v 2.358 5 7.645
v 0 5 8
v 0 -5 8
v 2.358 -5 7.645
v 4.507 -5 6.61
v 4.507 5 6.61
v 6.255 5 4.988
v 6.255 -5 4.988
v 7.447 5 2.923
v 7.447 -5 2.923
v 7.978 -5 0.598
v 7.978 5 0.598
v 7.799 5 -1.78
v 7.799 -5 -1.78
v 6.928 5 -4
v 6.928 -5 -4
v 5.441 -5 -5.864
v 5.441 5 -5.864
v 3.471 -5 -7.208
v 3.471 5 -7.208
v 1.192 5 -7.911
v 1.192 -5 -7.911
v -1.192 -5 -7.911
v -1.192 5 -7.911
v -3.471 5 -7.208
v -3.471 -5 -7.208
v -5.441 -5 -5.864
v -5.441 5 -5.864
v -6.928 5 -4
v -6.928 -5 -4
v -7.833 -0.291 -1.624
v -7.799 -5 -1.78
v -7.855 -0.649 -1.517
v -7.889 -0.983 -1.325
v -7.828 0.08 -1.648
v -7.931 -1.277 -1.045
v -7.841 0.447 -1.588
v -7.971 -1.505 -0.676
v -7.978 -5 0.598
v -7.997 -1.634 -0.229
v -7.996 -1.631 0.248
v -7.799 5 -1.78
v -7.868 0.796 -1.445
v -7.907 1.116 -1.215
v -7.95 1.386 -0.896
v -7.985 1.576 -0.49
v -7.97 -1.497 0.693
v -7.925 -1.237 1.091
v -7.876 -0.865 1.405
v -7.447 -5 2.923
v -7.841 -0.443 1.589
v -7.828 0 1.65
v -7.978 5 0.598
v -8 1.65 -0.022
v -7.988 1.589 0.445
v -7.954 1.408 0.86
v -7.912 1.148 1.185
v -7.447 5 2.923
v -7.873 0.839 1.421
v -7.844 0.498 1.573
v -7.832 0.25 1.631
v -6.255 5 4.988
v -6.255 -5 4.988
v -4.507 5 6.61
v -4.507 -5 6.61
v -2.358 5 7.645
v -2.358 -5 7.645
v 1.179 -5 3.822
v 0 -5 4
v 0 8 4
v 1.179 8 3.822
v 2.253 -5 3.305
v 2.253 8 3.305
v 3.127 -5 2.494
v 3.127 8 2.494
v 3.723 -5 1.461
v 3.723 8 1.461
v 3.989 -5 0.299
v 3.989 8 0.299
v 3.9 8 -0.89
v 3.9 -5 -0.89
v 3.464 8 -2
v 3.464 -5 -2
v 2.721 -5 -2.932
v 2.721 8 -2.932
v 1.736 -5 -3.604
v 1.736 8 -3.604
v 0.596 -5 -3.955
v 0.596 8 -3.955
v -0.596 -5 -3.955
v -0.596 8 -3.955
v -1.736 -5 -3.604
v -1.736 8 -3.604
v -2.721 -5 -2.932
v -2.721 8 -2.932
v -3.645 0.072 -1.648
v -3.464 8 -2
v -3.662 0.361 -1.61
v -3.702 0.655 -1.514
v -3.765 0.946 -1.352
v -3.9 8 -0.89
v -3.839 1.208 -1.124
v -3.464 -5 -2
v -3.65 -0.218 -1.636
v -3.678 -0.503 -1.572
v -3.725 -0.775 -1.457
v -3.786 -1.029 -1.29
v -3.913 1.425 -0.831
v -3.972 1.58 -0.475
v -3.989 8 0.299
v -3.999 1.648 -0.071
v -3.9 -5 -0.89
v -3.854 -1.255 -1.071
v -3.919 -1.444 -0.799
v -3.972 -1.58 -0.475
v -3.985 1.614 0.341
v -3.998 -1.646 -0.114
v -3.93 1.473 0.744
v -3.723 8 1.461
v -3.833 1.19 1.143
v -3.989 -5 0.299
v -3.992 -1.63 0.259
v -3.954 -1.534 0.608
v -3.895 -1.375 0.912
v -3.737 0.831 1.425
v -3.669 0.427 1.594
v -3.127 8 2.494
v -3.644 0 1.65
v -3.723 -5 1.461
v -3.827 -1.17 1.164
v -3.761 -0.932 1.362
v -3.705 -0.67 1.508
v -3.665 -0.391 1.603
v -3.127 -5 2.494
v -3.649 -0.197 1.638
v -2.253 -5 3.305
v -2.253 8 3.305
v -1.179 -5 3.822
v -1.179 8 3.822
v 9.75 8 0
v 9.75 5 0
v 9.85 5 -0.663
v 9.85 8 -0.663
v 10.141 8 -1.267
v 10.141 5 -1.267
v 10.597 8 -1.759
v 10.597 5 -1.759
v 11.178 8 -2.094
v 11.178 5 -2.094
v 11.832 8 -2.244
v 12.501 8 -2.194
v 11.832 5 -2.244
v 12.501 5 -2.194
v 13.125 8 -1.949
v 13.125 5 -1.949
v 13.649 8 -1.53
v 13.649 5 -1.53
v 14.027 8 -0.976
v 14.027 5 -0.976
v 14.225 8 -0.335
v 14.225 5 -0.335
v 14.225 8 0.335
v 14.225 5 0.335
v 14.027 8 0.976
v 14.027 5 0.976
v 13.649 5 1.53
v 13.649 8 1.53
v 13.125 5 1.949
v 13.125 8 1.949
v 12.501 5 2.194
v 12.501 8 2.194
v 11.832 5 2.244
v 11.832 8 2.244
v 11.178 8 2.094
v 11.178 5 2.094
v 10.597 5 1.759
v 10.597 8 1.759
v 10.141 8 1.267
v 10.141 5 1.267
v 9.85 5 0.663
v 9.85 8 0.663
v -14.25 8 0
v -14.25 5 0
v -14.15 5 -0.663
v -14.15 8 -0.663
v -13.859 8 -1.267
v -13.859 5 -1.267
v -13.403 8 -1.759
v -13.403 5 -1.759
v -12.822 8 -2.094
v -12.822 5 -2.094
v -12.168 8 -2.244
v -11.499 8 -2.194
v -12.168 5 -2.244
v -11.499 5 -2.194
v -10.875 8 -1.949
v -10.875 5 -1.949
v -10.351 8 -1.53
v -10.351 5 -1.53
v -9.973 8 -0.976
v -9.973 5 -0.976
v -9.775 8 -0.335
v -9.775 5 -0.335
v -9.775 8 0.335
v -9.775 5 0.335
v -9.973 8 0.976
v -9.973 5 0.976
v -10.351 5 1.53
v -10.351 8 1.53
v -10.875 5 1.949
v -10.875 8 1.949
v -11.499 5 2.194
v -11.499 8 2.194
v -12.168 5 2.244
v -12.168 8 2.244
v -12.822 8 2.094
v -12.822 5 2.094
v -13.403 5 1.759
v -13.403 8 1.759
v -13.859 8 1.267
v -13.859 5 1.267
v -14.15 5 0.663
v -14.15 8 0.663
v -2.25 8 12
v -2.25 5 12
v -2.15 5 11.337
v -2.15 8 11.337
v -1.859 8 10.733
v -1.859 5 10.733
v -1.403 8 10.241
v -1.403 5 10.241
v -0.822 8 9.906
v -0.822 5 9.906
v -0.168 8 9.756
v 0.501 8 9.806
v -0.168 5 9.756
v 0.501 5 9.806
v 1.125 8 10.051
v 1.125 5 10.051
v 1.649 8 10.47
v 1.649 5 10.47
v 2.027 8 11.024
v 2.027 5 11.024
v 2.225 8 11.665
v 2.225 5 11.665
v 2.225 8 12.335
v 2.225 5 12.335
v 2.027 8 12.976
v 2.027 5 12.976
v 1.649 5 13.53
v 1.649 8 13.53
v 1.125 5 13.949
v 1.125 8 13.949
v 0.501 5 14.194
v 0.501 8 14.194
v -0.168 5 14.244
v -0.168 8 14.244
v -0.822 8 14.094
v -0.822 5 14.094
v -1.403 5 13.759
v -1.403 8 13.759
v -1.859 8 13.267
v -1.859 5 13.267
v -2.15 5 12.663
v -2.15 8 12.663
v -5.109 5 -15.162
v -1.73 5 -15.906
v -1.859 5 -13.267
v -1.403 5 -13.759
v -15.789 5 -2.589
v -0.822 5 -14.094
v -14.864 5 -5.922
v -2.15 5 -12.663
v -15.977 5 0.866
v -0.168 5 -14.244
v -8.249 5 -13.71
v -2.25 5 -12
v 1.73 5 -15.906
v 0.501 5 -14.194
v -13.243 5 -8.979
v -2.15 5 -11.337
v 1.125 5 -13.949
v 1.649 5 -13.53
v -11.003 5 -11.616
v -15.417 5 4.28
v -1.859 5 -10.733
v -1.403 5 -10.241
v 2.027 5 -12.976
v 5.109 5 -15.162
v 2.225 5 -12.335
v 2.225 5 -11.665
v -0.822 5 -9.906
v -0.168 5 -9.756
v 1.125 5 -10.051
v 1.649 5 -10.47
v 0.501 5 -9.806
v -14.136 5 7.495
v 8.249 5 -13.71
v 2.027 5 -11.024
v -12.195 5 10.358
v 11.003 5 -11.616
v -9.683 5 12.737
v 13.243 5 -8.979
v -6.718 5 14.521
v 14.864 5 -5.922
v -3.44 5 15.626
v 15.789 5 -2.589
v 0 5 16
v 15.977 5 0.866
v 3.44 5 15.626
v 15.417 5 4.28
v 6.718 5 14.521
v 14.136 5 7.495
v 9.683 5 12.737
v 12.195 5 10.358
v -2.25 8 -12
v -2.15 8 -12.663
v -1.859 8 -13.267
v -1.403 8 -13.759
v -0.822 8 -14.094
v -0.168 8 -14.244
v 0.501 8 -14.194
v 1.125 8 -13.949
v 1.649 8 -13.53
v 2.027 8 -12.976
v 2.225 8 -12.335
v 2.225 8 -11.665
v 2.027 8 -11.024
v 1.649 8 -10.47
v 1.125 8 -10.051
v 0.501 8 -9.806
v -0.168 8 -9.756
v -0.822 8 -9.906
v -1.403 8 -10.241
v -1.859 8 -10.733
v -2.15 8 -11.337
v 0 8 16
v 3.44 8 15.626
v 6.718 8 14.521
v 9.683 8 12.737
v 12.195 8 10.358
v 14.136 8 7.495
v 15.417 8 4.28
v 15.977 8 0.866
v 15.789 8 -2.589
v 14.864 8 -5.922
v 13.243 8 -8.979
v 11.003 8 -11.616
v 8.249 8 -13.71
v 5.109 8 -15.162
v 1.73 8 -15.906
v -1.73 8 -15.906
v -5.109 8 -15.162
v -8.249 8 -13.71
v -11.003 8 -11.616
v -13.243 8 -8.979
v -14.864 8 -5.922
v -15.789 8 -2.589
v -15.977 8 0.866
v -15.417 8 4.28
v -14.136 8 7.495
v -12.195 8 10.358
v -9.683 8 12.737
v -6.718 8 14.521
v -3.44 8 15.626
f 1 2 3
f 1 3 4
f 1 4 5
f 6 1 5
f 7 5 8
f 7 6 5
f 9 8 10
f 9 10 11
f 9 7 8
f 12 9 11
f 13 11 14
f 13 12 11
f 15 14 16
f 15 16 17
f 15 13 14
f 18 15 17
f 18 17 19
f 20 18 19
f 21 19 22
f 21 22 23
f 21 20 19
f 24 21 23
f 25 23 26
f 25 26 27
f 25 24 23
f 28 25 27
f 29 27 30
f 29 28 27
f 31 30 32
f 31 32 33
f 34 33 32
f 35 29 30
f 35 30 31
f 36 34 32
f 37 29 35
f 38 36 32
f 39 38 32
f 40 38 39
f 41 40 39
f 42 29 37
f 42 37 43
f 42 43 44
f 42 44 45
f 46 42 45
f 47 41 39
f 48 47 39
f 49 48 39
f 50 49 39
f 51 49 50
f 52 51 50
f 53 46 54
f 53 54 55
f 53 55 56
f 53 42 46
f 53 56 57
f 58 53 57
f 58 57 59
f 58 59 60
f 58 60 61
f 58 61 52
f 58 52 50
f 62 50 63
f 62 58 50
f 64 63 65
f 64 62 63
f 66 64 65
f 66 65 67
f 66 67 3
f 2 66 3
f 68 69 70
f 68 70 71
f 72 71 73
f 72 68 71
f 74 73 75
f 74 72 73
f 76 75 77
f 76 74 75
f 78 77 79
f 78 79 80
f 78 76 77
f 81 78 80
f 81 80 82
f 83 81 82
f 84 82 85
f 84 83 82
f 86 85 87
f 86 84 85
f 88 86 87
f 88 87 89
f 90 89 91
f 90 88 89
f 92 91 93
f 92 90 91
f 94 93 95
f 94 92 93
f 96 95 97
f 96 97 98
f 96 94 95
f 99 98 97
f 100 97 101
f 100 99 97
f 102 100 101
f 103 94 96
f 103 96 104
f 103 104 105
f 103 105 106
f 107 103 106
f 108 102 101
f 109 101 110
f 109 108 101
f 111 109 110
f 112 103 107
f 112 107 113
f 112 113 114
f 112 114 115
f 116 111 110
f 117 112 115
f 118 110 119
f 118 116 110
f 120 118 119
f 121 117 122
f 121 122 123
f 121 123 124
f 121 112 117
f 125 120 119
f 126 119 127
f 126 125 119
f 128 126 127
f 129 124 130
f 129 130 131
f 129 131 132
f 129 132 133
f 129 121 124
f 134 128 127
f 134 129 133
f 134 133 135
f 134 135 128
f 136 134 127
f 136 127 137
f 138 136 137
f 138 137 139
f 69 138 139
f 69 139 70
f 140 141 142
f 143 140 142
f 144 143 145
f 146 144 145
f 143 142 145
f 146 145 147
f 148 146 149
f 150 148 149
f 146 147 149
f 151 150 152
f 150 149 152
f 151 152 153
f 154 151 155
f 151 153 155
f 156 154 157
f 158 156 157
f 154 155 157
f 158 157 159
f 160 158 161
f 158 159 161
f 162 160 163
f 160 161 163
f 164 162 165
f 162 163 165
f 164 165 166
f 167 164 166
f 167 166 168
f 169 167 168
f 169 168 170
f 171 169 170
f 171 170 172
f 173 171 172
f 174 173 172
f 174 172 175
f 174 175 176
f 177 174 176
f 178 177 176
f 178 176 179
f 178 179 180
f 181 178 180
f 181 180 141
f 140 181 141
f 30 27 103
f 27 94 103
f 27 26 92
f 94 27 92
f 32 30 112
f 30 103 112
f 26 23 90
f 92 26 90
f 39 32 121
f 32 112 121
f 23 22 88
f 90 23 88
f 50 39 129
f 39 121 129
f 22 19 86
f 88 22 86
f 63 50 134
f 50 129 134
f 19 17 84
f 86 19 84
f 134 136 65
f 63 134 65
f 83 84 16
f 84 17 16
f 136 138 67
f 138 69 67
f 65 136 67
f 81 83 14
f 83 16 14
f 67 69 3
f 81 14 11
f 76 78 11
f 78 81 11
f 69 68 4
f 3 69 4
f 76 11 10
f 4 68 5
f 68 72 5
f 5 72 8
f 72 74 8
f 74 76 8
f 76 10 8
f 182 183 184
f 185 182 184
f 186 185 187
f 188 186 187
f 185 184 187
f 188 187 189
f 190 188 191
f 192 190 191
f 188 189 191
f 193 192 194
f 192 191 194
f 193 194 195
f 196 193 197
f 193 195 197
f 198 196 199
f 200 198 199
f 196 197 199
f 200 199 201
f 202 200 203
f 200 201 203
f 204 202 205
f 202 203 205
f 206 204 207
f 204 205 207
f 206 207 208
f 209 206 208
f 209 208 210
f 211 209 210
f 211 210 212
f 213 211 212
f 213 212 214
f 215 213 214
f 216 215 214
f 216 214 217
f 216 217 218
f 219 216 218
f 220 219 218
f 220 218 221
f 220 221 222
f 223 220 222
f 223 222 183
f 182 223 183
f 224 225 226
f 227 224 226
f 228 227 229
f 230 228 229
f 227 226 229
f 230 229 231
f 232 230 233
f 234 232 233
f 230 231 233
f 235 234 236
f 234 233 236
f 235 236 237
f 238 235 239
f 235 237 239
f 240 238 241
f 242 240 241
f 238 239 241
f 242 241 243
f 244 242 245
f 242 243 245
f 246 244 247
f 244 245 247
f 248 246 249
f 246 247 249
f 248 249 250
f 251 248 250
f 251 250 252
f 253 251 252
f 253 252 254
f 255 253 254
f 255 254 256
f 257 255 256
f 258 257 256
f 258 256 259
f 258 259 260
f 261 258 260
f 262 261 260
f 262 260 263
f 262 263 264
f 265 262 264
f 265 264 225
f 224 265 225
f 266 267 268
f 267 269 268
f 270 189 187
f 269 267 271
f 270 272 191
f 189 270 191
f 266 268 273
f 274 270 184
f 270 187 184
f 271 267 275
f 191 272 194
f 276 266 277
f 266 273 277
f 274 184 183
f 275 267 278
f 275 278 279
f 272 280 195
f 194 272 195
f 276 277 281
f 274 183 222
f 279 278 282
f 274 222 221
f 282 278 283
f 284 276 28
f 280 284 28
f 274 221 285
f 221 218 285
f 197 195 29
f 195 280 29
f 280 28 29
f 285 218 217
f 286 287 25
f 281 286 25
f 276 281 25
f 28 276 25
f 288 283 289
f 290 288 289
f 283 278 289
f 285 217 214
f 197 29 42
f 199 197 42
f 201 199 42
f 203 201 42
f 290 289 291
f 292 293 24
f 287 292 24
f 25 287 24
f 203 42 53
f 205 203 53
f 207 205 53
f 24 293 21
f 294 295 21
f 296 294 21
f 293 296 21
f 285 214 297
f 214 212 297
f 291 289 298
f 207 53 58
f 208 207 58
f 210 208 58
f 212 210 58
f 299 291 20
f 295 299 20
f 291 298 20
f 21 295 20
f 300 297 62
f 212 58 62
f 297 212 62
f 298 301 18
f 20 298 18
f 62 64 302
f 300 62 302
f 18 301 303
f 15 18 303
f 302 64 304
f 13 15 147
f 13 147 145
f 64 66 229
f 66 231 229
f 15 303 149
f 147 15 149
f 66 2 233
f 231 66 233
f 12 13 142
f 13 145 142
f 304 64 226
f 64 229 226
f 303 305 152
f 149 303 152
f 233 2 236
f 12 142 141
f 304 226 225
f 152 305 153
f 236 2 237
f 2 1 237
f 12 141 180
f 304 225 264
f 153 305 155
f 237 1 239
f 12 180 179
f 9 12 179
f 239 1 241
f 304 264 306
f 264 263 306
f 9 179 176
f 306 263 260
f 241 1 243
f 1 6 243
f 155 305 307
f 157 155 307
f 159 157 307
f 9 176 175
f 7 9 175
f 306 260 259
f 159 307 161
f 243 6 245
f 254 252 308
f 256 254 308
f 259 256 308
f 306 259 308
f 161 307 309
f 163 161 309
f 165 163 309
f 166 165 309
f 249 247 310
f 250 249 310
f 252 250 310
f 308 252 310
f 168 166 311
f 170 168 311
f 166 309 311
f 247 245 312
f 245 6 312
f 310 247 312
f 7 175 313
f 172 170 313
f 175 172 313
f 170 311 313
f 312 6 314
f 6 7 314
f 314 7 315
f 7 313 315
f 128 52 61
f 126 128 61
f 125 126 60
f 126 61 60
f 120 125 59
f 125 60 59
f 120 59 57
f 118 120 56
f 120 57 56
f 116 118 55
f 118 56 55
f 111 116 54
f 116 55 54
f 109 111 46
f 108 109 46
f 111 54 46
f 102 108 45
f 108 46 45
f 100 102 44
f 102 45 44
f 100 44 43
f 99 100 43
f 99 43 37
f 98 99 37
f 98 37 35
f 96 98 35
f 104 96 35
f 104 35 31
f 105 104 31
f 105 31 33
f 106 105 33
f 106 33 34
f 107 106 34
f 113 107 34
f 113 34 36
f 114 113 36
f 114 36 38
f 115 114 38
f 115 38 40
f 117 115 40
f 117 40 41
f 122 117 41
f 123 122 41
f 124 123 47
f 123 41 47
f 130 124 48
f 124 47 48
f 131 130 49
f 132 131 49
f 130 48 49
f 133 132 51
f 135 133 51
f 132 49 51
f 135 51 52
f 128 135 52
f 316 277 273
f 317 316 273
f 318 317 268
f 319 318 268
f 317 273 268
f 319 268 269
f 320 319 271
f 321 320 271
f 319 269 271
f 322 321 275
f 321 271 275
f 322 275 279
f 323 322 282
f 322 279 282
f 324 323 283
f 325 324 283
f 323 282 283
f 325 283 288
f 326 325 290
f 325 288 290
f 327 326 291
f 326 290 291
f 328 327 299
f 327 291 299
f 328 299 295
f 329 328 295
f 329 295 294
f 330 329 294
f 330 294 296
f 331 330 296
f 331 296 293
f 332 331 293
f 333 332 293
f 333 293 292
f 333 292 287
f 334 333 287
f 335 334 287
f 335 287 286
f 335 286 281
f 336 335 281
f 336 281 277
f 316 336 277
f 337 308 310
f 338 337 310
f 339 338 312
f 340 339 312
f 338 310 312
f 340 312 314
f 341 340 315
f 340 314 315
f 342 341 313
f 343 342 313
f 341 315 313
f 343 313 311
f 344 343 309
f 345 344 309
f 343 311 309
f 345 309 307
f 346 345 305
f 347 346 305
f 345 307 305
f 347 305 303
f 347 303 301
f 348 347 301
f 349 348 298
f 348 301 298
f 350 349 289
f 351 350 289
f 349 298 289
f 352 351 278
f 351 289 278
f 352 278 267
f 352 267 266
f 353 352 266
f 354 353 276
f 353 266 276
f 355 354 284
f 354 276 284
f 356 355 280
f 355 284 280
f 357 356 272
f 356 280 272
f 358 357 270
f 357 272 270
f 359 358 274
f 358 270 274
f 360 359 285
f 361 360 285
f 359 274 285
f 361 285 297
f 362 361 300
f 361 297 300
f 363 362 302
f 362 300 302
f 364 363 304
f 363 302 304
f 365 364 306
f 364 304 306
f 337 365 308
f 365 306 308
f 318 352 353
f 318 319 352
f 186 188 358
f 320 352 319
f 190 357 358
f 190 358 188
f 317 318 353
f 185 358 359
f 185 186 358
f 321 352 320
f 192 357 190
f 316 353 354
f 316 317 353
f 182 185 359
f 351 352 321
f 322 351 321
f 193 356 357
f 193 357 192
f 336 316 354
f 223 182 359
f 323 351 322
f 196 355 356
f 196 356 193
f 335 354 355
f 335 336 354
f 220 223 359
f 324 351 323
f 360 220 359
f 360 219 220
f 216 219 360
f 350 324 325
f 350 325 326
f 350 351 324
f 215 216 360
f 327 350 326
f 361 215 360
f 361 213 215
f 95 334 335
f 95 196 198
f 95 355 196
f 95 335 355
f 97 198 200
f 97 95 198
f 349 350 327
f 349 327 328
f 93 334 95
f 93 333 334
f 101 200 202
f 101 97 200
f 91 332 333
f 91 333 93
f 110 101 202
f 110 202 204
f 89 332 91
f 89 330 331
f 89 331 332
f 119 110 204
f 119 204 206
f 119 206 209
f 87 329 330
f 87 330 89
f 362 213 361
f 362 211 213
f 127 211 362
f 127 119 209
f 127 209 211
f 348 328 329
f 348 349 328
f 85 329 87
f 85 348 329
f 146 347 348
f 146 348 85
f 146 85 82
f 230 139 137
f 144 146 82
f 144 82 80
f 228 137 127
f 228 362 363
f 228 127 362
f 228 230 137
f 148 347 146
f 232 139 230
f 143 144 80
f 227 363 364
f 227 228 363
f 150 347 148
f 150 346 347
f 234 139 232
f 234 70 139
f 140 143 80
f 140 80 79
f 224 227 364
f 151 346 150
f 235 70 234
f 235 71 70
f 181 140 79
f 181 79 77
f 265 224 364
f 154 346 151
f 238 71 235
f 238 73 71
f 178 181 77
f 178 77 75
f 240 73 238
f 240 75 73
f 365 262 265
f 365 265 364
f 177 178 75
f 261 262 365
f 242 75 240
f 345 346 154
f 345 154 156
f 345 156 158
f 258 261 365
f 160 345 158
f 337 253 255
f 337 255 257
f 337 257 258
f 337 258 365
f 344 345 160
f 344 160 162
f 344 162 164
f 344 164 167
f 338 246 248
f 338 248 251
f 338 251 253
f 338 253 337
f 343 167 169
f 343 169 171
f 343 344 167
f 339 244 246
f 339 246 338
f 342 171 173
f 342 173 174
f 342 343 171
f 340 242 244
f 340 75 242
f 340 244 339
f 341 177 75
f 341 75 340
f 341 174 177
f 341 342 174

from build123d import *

# Parameters (mm, degrees)
SKETCH1_R                  = 8
SKETCH1_R_2                = 4
BOSS_EXTRUDE1_DEPTH        = 5
SKETCH2_R                  = 16
SKETCH2_R_2                = 4
BOSS_EXTRUDE2_DEPTH        = 3
M4X0_7_TAPPED_HOLE1_REACH  = 31.933
M4X0_7_TAPPED_HOLE1_BORE_R = 1.65
M4_CLEARANCE_HOLE1_D       = 4.5


with BuildPart() as part:
    # Sketch1 → Boss-Extrude1 (new, symmetric)
    with BuildSketch(Plane(origin=(0, 0, 0), x_dir=(1, 0, 0), z_dir=(0, 1, 0))):
        with Locations(Location((0, 0, 0), (0, 0, 270))):
            Circle(SKETCH1_R)
        with Locations(Location((0, 0, 0), (0, 0, 270))):
            Circle(SKETCH1_R_2, mode=Mode.SUBTRACT)
    extrude(amount=BOSS_EXTRUDE1_DEPTH, both=True)

    # Sketch2 → Boss-Extrude2 (add)
    with BuildSketch(Plane(origin=(0, 5, 0), x_dir=(1, 0, 0), z_dir=(0, 1, 0))):
        with Locations(Location((0, 0, 0), (0, 0, 270))):
            Circle(SKETCH2_R)
        with Locations(Location((0, 0, 0), (0, 0, 270))):
            Circle(SKETCH2_R_2, mode=Mode.SUBTRACT)
    extrude(amount=BOSS_EXTRUDE2_DEPTH)

    # M4x0.7 Tapped Hole1 bore → M4x0.7 Tapped Hole1 (cut, up to next)
    with BuildSketch(Plane.ZY.offset(8), mode=Mode.PRIVATE) as m4x0_7_tapped_hole1_sk1:
        Circle(M4X0_7_TAPPED_HOLE1_BORE_R)
    m4x0_7_tapped_hole1_tool1 = extrude(m4x0_7_tapped_hole1_sk1.sketch, amount=-M4X0_7_TAPPED_HOLE1_REACH, mode=Mode.PRIVATE) & part.part
    add(m4x0_7_tapped_hole1_tool1.solids().sort_by_distance((-8, 0, 0))[0], mode=Mode.SUBTRACT)

    # M4 Clearance Hole1 (through all)
    with Locations(Plane(origin=(0, 8, 0), x_dir=(1, 0, 0), z_dir=(0, 1, 0))):
        with Locations((0, 12), (12, 0), (-12, 0), (0, -12)):
            Hole(M4_CLEARANCE_HOLE1_D / 2)


solid = part.part
